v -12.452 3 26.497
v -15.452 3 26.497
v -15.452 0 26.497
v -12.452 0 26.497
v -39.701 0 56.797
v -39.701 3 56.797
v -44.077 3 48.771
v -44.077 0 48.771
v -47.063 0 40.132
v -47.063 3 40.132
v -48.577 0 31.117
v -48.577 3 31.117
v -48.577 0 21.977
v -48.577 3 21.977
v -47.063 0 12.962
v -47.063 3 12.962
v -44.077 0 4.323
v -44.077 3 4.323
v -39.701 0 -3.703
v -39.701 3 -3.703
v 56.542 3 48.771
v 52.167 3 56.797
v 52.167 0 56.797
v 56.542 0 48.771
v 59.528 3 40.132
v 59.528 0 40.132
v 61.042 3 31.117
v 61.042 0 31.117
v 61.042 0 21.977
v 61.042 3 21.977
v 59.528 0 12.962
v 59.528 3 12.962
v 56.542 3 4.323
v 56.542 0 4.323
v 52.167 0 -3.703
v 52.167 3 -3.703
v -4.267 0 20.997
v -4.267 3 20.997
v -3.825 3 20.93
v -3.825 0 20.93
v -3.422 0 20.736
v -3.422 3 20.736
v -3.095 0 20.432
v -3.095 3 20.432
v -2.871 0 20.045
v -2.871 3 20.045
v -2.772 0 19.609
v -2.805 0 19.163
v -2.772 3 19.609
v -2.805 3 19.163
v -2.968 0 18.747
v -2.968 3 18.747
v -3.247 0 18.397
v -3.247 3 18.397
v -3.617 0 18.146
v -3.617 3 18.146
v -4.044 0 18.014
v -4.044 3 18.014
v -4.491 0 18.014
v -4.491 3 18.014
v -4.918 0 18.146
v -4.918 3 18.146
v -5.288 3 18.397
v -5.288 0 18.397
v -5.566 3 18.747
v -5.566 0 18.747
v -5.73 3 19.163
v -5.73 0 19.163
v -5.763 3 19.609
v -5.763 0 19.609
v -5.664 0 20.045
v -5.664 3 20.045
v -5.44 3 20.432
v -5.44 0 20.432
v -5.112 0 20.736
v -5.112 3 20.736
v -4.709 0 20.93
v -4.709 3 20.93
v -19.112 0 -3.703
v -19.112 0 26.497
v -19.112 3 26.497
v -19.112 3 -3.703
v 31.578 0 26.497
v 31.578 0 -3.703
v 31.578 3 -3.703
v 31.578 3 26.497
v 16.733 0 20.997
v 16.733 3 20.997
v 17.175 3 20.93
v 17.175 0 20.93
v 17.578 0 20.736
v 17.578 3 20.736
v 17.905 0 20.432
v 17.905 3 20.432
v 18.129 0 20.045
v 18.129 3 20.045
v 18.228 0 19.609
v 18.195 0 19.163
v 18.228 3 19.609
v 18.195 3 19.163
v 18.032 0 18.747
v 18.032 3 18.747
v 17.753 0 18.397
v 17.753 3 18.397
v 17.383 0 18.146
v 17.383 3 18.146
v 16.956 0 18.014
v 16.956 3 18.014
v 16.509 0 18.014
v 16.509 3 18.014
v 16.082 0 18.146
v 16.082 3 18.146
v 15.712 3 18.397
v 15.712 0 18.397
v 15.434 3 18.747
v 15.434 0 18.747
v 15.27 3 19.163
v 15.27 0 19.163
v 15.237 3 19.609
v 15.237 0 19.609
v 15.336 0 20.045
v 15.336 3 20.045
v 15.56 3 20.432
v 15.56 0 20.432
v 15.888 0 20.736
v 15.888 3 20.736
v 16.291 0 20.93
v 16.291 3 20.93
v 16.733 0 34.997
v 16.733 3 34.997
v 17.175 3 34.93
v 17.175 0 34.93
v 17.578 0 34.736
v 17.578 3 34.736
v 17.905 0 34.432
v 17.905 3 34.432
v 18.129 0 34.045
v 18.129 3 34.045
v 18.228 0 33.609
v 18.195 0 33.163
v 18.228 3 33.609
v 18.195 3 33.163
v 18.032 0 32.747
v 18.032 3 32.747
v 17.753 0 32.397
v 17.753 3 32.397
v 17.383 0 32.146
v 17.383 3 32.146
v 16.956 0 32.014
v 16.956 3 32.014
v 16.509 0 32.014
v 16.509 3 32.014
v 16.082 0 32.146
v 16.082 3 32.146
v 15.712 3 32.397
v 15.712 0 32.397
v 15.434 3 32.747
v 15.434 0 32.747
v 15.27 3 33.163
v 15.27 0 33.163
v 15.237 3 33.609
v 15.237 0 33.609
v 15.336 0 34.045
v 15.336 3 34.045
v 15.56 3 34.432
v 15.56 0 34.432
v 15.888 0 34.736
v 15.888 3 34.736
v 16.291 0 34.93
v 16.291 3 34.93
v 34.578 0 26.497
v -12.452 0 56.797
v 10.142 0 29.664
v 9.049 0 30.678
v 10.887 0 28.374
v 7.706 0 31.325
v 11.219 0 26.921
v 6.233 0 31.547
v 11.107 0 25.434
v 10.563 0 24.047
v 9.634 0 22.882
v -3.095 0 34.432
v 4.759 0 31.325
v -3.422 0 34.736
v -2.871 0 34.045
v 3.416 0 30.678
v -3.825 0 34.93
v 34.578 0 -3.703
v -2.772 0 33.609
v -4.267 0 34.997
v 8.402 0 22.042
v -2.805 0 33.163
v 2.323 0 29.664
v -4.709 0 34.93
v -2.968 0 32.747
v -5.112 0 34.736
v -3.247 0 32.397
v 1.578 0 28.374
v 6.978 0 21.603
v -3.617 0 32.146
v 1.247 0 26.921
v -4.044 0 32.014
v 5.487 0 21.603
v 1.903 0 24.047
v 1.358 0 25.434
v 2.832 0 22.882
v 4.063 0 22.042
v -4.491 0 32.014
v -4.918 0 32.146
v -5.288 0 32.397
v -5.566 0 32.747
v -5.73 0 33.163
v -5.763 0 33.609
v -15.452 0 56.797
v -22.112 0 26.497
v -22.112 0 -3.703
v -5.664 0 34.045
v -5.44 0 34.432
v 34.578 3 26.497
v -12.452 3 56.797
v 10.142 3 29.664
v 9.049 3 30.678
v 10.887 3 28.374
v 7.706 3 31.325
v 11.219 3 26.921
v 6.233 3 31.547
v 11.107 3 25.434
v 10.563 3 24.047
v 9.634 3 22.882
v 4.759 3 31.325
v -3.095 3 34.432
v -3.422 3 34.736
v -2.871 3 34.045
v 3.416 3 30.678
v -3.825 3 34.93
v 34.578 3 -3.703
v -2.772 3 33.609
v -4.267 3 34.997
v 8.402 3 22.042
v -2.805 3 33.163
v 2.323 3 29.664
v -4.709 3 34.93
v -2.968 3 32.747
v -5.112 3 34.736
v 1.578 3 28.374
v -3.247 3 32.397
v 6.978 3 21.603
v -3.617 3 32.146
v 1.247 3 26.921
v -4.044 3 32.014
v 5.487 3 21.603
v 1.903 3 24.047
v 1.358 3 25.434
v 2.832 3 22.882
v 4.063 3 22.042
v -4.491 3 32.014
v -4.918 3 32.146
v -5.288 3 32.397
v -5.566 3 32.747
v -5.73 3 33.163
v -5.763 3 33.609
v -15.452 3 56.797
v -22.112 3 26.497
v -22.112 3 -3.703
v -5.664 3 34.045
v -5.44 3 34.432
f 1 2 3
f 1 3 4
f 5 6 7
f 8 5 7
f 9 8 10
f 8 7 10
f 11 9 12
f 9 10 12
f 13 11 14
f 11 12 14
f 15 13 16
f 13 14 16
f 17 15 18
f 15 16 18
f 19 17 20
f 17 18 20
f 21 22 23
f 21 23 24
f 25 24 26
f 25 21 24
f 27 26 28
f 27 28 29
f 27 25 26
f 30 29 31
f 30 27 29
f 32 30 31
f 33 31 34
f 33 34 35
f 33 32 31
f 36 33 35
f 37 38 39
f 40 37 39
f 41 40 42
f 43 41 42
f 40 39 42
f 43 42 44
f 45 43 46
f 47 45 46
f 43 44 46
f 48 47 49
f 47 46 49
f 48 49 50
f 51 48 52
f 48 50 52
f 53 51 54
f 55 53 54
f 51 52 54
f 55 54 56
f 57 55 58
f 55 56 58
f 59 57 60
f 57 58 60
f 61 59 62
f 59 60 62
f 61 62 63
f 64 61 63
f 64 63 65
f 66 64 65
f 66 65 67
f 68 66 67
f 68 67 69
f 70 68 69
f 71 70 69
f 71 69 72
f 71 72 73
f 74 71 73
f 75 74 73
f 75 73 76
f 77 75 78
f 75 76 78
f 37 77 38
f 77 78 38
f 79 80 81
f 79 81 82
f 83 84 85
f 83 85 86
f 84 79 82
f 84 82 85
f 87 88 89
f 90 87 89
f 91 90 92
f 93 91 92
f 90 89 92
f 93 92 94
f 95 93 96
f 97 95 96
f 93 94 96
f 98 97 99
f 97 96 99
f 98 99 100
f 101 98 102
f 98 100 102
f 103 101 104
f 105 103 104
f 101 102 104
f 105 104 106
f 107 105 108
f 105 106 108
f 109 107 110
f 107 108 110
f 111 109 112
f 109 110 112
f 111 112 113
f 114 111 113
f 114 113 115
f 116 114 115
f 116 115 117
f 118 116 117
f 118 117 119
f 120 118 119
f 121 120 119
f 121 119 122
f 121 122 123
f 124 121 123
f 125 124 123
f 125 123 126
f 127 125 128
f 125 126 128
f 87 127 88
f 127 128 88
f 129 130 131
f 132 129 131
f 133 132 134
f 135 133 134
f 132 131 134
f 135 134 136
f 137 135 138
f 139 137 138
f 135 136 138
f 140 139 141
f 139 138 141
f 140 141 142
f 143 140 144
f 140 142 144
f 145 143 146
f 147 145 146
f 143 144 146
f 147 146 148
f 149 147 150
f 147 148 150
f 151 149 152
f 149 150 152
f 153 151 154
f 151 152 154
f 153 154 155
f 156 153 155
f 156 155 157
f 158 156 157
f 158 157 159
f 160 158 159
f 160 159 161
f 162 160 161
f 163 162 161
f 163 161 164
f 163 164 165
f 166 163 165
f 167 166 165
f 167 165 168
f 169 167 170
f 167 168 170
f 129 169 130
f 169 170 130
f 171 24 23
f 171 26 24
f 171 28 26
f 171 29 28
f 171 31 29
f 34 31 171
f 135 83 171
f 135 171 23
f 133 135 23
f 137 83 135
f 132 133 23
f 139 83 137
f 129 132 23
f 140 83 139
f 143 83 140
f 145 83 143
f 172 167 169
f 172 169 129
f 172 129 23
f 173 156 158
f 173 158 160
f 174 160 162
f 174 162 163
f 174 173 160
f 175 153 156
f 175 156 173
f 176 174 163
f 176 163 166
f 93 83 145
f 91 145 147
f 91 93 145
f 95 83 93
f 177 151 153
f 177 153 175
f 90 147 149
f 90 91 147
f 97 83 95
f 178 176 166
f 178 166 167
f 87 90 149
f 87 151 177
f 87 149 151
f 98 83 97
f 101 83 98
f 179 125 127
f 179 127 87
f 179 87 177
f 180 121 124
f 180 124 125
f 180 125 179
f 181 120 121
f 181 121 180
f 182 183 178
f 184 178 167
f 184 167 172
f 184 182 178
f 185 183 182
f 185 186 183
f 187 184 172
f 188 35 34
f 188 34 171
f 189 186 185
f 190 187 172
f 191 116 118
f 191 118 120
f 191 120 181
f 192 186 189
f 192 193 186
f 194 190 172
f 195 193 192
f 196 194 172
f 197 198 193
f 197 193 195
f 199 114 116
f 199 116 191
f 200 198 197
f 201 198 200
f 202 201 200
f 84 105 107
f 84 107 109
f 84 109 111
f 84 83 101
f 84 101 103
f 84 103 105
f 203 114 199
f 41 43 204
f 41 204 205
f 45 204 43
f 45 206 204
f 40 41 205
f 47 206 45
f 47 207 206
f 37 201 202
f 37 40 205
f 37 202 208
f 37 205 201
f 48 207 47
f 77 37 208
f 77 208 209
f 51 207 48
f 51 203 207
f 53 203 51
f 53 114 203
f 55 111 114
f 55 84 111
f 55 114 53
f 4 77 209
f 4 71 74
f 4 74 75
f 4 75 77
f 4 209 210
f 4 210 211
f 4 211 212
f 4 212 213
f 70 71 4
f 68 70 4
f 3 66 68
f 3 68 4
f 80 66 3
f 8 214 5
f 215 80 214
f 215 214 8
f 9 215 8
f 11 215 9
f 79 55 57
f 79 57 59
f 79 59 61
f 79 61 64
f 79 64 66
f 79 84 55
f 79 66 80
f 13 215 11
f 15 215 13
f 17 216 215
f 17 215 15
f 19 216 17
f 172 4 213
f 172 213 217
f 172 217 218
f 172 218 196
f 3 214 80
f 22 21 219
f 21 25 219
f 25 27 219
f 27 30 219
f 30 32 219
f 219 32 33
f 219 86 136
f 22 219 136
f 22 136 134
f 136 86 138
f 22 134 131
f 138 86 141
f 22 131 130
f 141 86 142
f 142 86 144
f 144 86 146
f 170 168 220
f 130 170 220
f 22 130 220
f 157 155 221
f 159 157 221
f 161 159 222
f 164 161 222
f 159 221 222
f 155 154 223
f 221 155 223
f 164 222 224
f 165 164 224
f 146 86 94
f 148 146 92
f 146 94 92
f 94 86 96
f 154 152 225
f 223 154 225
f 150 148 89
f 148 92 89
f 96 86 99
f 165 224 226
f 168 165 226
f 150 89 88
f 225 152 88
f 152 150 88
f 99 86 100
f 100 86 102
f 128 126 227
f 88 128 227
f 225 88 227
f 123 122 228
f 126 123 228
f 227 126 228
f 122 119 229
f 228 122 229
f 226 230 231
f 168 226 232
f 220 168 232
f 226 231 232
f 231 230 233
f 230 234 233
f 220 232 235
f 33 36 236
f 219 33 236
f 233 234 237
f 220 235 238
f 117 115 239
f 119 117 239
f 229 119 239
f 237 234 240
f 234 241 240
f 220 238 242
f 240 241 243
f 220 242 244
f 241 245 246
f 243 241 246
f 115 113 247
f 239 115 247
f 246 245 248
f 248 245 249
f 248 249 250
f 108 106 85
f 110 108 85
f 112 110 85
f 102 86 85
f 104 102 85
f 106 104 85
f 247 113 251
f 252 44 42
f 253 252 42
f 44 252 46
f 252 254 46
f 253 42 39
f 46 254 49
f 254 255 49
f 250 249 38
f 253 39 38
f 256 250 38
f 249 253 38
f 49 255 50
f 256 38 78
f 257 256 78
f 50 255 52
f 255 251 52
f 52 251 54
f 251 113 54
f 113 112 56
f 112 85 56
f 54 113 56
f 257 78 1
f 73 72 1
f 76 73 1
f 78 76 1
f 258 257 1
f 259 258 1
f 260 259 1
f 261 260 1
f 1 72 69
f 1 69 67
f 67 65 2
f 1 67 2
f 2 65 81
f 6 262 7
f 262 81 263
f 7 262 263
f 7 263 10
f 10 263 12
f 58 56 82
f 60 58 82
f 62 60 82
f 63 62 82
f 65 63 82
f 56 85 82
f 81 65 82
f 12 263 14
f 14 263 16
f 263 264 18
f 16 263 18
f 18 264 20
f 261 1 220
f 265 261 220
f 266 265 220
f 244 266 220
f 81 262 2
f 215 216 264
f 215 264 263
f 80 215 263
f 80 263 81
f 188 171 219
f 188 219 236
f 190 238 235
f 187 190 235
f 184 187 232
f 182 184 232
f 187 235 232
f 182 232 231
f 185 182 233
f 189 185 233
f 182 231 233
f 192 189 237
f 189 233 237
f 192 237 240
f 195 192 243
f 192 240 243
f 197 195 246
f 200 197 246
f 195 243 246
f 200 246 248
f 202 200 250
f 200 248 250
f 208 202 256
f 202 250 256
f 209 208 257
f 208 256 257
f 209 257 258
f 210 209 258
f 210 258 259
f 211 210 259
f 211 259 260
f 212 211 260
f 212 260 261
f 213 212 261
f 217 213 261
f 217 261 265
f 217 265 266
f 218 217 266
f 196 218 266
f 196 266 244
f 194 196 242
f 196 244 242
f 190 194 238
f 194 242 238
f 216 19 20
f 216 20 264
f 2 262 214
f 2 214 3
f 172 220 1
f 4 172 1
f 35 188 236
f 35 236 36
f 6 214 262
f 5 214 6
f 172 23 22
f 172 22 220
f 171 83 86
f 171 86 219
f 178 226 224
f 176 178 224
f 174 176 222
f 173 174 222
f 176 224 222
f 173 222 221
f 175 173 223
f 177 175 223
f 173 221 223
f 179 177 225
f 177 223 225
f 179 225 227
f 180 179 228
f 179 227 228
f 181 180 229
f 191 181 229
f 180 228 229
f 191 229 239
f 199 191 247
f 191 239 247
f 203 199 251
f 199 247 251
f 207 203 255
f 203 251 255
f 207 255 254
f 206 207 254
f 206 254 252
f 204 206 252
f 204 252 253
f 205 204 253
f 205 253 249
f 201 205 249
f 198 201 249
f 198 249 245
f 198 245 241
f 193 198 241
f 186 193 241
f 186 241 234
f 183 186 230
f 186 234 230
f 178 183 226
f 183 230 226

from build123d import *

# Parameters (mm, degrees)
BOSS_EXTRUDE1_DEPTH = 3
SKETCH4_R           = 5
CUT_EXTRUDE1_DEPTH  = 3
SKETCH6_R           = 1.5
CUT_EXTRUDE2_DEPTH  = 3
CUT_EXTRUDE3_DEPTH  = 3
SKETCH8_W           = 3
SKETCH8_H           = 30.3
CUT_EXTRUDE4_DEPTH  = 3


with BuildPart() as part:
    # Sketch3 → Boss-Extrude1 (new body)
    with BuildSketch(Plane(origin=(0, 0, 0), x_dir=(1, 0, 0), z_dir=(0, 1, 0))):
        with BuildLine():
            Line((-42.11236018, 3.702994226), (-22.11236018, 3.702994226))
            Line((-22.11236018, 3.702994226), (-22.11236018, -26.497005774))
            Line((-22.11236018, -26.497005774), (-19.11236018, -26.497005774))
            Line((-19.11236018, -26.497005774), (-19.11236018, 3.702994226))
            Line((-19.11236018, 3.702994226), (-15.45236018, 3.702994226))
            Line((-15.45236018, 3.702994226), (-12.45236018, 3.702994226))
            Line((-12.45236018, 3.702994226), (31.57763982, 3.702994226))
            Line((31.57763982, 3.702994226), (31.57763982, -26.497005774))
            Line((31.57763982, -26.497005774), (34.57763982, -26.497005774))
            Line((34.57763982, -26.497005774), (34.57763982, 3.702994226))
            Line((34.57763982, 3.702994226), (54.57763982, 3.702994226))
            ThreePointArc((54.57763982, 3.702994226), (61.648707631, 0.774062038), (64.57763982, -6.297005774))
            Line((64.57763982, -6.297005774), (64.57763982, -46.797005774))
            ThreePointArc((64.57763982, -46.797005774), (61.648707631, -53.868073586), (54.57763982, -56.797005774))
            Line((54.57763982, -56.797005774), (-42.11236018, -56.797005774))
            ThreePointArc((-42.11236018, -56.797005774), (-49.183427992, -53.868073586), (-52.11236018, -46.797005774))
            Line((-52.11236018, -46.797005774), (-52.11236018, -6.297005774))
            ThreePointArc((-52.11236018, -6.297005774), (-49.183427992, 0.774062038), (-42.11236018, 3.702994226))
        make_face()
    extrude(amount=BOSS_EXTRUDE1_DEPTH)

    # Sketch4 → Cut-Extrude1 (cut)
    with BuildSketch(Plane(origin=(0, 3, 0), x_dir=(1, 0, 0), z_dir=(0, 1, 0))):
        with Locations(Location((6.23263982, -26.547005774, 0), (0, 0, 270))):
            Circle(SKETCH4_R)
    extrude(amount=-CUT_EXTRUDE1_DEPTH, mode=Mode.SUBTRACT)

    # Sketch6 → Cut-Extrude2 (cut)
    with BuildSketch(Plane(origin=(0, 3, 0), x_dir=(1, 0, 0), z_dir=(0, 1, 0))):
        with Locations(Location((-4.26736018, -19.497005774, 0), (0, 0, 270))):
            Circle(SKETCH6_R)
        with Locations(Location((-4.26736018, -33.497005774, 0), (0, 0, 270))):
            Circle(SKETCH6_R)
        with Locations(Location((16.73263982, -19.497005774, 0), (0, 0, 270))):
            Circle(SKETCH6_R)
        with Locations(Location((16.73263982, -33.497005774, 0), (0, 0, 270))):
            Circle(SKETCH6_R)
    extrude(amount=-CUT_EXTRUDE2_DEPTH, mode=Mode.SUBTRACT)

    # Sketch7 → Cut-Extrude3 (cut)
    with BuildSketch(Plane(origin=(0, 3, 0), x_dir=(1, 0, 0), z_dir=(0, 1, 0))):
        with BuildLine():
            Line((52.166695813, 3.702994226), (73.459164028, 3.702994226))
            Line((73.459164028, 3.702994226), (73.459164028, -56.797005774))
            Line((73.459164028, -56.797005774), (52.166695813, -56.797005774))
            ThreePointArc((52.166695813, -56.797005774), (61.23263982, -26.547005774), (52.166695813, 3.702994226))
        make_face()
        with BuildLine():
            Line((-39.701416174, 3.702994226), (-60.819947715, 3.702994226))
            Line((-60.819947715, 3.702994226), (-60.819947715, -56.797005774))
            Line((-60.819947715, -56.797005774), (-39.701416174, -56.797005774))
            ThreePointArc((-39.701416174, -56.797005774), (-48.76736018, -26.547005774), (-39.701416174, 3.702994226))
        make_face()
    extrude(amount=-CUT_EXTRUDE3_DEPTH, mode=Mode.SUBTRACT)

    # Sketch8 → Cut-Extrude4 (cut)
    with BuildSketch(Plane(origin=(0, 3, 0), x_dir=(1, 0, 0), z_dir=(0, 1, 0))):
        with Locations((-13.95236018, -41.647005774)):
            Rectangle(SKETCH8_W, SKETCH8_H)
    extrude(amount=-CUT_EXTRUDE4_DEPTH, mode=Mode.SUBTRACT)


solid = part.part
